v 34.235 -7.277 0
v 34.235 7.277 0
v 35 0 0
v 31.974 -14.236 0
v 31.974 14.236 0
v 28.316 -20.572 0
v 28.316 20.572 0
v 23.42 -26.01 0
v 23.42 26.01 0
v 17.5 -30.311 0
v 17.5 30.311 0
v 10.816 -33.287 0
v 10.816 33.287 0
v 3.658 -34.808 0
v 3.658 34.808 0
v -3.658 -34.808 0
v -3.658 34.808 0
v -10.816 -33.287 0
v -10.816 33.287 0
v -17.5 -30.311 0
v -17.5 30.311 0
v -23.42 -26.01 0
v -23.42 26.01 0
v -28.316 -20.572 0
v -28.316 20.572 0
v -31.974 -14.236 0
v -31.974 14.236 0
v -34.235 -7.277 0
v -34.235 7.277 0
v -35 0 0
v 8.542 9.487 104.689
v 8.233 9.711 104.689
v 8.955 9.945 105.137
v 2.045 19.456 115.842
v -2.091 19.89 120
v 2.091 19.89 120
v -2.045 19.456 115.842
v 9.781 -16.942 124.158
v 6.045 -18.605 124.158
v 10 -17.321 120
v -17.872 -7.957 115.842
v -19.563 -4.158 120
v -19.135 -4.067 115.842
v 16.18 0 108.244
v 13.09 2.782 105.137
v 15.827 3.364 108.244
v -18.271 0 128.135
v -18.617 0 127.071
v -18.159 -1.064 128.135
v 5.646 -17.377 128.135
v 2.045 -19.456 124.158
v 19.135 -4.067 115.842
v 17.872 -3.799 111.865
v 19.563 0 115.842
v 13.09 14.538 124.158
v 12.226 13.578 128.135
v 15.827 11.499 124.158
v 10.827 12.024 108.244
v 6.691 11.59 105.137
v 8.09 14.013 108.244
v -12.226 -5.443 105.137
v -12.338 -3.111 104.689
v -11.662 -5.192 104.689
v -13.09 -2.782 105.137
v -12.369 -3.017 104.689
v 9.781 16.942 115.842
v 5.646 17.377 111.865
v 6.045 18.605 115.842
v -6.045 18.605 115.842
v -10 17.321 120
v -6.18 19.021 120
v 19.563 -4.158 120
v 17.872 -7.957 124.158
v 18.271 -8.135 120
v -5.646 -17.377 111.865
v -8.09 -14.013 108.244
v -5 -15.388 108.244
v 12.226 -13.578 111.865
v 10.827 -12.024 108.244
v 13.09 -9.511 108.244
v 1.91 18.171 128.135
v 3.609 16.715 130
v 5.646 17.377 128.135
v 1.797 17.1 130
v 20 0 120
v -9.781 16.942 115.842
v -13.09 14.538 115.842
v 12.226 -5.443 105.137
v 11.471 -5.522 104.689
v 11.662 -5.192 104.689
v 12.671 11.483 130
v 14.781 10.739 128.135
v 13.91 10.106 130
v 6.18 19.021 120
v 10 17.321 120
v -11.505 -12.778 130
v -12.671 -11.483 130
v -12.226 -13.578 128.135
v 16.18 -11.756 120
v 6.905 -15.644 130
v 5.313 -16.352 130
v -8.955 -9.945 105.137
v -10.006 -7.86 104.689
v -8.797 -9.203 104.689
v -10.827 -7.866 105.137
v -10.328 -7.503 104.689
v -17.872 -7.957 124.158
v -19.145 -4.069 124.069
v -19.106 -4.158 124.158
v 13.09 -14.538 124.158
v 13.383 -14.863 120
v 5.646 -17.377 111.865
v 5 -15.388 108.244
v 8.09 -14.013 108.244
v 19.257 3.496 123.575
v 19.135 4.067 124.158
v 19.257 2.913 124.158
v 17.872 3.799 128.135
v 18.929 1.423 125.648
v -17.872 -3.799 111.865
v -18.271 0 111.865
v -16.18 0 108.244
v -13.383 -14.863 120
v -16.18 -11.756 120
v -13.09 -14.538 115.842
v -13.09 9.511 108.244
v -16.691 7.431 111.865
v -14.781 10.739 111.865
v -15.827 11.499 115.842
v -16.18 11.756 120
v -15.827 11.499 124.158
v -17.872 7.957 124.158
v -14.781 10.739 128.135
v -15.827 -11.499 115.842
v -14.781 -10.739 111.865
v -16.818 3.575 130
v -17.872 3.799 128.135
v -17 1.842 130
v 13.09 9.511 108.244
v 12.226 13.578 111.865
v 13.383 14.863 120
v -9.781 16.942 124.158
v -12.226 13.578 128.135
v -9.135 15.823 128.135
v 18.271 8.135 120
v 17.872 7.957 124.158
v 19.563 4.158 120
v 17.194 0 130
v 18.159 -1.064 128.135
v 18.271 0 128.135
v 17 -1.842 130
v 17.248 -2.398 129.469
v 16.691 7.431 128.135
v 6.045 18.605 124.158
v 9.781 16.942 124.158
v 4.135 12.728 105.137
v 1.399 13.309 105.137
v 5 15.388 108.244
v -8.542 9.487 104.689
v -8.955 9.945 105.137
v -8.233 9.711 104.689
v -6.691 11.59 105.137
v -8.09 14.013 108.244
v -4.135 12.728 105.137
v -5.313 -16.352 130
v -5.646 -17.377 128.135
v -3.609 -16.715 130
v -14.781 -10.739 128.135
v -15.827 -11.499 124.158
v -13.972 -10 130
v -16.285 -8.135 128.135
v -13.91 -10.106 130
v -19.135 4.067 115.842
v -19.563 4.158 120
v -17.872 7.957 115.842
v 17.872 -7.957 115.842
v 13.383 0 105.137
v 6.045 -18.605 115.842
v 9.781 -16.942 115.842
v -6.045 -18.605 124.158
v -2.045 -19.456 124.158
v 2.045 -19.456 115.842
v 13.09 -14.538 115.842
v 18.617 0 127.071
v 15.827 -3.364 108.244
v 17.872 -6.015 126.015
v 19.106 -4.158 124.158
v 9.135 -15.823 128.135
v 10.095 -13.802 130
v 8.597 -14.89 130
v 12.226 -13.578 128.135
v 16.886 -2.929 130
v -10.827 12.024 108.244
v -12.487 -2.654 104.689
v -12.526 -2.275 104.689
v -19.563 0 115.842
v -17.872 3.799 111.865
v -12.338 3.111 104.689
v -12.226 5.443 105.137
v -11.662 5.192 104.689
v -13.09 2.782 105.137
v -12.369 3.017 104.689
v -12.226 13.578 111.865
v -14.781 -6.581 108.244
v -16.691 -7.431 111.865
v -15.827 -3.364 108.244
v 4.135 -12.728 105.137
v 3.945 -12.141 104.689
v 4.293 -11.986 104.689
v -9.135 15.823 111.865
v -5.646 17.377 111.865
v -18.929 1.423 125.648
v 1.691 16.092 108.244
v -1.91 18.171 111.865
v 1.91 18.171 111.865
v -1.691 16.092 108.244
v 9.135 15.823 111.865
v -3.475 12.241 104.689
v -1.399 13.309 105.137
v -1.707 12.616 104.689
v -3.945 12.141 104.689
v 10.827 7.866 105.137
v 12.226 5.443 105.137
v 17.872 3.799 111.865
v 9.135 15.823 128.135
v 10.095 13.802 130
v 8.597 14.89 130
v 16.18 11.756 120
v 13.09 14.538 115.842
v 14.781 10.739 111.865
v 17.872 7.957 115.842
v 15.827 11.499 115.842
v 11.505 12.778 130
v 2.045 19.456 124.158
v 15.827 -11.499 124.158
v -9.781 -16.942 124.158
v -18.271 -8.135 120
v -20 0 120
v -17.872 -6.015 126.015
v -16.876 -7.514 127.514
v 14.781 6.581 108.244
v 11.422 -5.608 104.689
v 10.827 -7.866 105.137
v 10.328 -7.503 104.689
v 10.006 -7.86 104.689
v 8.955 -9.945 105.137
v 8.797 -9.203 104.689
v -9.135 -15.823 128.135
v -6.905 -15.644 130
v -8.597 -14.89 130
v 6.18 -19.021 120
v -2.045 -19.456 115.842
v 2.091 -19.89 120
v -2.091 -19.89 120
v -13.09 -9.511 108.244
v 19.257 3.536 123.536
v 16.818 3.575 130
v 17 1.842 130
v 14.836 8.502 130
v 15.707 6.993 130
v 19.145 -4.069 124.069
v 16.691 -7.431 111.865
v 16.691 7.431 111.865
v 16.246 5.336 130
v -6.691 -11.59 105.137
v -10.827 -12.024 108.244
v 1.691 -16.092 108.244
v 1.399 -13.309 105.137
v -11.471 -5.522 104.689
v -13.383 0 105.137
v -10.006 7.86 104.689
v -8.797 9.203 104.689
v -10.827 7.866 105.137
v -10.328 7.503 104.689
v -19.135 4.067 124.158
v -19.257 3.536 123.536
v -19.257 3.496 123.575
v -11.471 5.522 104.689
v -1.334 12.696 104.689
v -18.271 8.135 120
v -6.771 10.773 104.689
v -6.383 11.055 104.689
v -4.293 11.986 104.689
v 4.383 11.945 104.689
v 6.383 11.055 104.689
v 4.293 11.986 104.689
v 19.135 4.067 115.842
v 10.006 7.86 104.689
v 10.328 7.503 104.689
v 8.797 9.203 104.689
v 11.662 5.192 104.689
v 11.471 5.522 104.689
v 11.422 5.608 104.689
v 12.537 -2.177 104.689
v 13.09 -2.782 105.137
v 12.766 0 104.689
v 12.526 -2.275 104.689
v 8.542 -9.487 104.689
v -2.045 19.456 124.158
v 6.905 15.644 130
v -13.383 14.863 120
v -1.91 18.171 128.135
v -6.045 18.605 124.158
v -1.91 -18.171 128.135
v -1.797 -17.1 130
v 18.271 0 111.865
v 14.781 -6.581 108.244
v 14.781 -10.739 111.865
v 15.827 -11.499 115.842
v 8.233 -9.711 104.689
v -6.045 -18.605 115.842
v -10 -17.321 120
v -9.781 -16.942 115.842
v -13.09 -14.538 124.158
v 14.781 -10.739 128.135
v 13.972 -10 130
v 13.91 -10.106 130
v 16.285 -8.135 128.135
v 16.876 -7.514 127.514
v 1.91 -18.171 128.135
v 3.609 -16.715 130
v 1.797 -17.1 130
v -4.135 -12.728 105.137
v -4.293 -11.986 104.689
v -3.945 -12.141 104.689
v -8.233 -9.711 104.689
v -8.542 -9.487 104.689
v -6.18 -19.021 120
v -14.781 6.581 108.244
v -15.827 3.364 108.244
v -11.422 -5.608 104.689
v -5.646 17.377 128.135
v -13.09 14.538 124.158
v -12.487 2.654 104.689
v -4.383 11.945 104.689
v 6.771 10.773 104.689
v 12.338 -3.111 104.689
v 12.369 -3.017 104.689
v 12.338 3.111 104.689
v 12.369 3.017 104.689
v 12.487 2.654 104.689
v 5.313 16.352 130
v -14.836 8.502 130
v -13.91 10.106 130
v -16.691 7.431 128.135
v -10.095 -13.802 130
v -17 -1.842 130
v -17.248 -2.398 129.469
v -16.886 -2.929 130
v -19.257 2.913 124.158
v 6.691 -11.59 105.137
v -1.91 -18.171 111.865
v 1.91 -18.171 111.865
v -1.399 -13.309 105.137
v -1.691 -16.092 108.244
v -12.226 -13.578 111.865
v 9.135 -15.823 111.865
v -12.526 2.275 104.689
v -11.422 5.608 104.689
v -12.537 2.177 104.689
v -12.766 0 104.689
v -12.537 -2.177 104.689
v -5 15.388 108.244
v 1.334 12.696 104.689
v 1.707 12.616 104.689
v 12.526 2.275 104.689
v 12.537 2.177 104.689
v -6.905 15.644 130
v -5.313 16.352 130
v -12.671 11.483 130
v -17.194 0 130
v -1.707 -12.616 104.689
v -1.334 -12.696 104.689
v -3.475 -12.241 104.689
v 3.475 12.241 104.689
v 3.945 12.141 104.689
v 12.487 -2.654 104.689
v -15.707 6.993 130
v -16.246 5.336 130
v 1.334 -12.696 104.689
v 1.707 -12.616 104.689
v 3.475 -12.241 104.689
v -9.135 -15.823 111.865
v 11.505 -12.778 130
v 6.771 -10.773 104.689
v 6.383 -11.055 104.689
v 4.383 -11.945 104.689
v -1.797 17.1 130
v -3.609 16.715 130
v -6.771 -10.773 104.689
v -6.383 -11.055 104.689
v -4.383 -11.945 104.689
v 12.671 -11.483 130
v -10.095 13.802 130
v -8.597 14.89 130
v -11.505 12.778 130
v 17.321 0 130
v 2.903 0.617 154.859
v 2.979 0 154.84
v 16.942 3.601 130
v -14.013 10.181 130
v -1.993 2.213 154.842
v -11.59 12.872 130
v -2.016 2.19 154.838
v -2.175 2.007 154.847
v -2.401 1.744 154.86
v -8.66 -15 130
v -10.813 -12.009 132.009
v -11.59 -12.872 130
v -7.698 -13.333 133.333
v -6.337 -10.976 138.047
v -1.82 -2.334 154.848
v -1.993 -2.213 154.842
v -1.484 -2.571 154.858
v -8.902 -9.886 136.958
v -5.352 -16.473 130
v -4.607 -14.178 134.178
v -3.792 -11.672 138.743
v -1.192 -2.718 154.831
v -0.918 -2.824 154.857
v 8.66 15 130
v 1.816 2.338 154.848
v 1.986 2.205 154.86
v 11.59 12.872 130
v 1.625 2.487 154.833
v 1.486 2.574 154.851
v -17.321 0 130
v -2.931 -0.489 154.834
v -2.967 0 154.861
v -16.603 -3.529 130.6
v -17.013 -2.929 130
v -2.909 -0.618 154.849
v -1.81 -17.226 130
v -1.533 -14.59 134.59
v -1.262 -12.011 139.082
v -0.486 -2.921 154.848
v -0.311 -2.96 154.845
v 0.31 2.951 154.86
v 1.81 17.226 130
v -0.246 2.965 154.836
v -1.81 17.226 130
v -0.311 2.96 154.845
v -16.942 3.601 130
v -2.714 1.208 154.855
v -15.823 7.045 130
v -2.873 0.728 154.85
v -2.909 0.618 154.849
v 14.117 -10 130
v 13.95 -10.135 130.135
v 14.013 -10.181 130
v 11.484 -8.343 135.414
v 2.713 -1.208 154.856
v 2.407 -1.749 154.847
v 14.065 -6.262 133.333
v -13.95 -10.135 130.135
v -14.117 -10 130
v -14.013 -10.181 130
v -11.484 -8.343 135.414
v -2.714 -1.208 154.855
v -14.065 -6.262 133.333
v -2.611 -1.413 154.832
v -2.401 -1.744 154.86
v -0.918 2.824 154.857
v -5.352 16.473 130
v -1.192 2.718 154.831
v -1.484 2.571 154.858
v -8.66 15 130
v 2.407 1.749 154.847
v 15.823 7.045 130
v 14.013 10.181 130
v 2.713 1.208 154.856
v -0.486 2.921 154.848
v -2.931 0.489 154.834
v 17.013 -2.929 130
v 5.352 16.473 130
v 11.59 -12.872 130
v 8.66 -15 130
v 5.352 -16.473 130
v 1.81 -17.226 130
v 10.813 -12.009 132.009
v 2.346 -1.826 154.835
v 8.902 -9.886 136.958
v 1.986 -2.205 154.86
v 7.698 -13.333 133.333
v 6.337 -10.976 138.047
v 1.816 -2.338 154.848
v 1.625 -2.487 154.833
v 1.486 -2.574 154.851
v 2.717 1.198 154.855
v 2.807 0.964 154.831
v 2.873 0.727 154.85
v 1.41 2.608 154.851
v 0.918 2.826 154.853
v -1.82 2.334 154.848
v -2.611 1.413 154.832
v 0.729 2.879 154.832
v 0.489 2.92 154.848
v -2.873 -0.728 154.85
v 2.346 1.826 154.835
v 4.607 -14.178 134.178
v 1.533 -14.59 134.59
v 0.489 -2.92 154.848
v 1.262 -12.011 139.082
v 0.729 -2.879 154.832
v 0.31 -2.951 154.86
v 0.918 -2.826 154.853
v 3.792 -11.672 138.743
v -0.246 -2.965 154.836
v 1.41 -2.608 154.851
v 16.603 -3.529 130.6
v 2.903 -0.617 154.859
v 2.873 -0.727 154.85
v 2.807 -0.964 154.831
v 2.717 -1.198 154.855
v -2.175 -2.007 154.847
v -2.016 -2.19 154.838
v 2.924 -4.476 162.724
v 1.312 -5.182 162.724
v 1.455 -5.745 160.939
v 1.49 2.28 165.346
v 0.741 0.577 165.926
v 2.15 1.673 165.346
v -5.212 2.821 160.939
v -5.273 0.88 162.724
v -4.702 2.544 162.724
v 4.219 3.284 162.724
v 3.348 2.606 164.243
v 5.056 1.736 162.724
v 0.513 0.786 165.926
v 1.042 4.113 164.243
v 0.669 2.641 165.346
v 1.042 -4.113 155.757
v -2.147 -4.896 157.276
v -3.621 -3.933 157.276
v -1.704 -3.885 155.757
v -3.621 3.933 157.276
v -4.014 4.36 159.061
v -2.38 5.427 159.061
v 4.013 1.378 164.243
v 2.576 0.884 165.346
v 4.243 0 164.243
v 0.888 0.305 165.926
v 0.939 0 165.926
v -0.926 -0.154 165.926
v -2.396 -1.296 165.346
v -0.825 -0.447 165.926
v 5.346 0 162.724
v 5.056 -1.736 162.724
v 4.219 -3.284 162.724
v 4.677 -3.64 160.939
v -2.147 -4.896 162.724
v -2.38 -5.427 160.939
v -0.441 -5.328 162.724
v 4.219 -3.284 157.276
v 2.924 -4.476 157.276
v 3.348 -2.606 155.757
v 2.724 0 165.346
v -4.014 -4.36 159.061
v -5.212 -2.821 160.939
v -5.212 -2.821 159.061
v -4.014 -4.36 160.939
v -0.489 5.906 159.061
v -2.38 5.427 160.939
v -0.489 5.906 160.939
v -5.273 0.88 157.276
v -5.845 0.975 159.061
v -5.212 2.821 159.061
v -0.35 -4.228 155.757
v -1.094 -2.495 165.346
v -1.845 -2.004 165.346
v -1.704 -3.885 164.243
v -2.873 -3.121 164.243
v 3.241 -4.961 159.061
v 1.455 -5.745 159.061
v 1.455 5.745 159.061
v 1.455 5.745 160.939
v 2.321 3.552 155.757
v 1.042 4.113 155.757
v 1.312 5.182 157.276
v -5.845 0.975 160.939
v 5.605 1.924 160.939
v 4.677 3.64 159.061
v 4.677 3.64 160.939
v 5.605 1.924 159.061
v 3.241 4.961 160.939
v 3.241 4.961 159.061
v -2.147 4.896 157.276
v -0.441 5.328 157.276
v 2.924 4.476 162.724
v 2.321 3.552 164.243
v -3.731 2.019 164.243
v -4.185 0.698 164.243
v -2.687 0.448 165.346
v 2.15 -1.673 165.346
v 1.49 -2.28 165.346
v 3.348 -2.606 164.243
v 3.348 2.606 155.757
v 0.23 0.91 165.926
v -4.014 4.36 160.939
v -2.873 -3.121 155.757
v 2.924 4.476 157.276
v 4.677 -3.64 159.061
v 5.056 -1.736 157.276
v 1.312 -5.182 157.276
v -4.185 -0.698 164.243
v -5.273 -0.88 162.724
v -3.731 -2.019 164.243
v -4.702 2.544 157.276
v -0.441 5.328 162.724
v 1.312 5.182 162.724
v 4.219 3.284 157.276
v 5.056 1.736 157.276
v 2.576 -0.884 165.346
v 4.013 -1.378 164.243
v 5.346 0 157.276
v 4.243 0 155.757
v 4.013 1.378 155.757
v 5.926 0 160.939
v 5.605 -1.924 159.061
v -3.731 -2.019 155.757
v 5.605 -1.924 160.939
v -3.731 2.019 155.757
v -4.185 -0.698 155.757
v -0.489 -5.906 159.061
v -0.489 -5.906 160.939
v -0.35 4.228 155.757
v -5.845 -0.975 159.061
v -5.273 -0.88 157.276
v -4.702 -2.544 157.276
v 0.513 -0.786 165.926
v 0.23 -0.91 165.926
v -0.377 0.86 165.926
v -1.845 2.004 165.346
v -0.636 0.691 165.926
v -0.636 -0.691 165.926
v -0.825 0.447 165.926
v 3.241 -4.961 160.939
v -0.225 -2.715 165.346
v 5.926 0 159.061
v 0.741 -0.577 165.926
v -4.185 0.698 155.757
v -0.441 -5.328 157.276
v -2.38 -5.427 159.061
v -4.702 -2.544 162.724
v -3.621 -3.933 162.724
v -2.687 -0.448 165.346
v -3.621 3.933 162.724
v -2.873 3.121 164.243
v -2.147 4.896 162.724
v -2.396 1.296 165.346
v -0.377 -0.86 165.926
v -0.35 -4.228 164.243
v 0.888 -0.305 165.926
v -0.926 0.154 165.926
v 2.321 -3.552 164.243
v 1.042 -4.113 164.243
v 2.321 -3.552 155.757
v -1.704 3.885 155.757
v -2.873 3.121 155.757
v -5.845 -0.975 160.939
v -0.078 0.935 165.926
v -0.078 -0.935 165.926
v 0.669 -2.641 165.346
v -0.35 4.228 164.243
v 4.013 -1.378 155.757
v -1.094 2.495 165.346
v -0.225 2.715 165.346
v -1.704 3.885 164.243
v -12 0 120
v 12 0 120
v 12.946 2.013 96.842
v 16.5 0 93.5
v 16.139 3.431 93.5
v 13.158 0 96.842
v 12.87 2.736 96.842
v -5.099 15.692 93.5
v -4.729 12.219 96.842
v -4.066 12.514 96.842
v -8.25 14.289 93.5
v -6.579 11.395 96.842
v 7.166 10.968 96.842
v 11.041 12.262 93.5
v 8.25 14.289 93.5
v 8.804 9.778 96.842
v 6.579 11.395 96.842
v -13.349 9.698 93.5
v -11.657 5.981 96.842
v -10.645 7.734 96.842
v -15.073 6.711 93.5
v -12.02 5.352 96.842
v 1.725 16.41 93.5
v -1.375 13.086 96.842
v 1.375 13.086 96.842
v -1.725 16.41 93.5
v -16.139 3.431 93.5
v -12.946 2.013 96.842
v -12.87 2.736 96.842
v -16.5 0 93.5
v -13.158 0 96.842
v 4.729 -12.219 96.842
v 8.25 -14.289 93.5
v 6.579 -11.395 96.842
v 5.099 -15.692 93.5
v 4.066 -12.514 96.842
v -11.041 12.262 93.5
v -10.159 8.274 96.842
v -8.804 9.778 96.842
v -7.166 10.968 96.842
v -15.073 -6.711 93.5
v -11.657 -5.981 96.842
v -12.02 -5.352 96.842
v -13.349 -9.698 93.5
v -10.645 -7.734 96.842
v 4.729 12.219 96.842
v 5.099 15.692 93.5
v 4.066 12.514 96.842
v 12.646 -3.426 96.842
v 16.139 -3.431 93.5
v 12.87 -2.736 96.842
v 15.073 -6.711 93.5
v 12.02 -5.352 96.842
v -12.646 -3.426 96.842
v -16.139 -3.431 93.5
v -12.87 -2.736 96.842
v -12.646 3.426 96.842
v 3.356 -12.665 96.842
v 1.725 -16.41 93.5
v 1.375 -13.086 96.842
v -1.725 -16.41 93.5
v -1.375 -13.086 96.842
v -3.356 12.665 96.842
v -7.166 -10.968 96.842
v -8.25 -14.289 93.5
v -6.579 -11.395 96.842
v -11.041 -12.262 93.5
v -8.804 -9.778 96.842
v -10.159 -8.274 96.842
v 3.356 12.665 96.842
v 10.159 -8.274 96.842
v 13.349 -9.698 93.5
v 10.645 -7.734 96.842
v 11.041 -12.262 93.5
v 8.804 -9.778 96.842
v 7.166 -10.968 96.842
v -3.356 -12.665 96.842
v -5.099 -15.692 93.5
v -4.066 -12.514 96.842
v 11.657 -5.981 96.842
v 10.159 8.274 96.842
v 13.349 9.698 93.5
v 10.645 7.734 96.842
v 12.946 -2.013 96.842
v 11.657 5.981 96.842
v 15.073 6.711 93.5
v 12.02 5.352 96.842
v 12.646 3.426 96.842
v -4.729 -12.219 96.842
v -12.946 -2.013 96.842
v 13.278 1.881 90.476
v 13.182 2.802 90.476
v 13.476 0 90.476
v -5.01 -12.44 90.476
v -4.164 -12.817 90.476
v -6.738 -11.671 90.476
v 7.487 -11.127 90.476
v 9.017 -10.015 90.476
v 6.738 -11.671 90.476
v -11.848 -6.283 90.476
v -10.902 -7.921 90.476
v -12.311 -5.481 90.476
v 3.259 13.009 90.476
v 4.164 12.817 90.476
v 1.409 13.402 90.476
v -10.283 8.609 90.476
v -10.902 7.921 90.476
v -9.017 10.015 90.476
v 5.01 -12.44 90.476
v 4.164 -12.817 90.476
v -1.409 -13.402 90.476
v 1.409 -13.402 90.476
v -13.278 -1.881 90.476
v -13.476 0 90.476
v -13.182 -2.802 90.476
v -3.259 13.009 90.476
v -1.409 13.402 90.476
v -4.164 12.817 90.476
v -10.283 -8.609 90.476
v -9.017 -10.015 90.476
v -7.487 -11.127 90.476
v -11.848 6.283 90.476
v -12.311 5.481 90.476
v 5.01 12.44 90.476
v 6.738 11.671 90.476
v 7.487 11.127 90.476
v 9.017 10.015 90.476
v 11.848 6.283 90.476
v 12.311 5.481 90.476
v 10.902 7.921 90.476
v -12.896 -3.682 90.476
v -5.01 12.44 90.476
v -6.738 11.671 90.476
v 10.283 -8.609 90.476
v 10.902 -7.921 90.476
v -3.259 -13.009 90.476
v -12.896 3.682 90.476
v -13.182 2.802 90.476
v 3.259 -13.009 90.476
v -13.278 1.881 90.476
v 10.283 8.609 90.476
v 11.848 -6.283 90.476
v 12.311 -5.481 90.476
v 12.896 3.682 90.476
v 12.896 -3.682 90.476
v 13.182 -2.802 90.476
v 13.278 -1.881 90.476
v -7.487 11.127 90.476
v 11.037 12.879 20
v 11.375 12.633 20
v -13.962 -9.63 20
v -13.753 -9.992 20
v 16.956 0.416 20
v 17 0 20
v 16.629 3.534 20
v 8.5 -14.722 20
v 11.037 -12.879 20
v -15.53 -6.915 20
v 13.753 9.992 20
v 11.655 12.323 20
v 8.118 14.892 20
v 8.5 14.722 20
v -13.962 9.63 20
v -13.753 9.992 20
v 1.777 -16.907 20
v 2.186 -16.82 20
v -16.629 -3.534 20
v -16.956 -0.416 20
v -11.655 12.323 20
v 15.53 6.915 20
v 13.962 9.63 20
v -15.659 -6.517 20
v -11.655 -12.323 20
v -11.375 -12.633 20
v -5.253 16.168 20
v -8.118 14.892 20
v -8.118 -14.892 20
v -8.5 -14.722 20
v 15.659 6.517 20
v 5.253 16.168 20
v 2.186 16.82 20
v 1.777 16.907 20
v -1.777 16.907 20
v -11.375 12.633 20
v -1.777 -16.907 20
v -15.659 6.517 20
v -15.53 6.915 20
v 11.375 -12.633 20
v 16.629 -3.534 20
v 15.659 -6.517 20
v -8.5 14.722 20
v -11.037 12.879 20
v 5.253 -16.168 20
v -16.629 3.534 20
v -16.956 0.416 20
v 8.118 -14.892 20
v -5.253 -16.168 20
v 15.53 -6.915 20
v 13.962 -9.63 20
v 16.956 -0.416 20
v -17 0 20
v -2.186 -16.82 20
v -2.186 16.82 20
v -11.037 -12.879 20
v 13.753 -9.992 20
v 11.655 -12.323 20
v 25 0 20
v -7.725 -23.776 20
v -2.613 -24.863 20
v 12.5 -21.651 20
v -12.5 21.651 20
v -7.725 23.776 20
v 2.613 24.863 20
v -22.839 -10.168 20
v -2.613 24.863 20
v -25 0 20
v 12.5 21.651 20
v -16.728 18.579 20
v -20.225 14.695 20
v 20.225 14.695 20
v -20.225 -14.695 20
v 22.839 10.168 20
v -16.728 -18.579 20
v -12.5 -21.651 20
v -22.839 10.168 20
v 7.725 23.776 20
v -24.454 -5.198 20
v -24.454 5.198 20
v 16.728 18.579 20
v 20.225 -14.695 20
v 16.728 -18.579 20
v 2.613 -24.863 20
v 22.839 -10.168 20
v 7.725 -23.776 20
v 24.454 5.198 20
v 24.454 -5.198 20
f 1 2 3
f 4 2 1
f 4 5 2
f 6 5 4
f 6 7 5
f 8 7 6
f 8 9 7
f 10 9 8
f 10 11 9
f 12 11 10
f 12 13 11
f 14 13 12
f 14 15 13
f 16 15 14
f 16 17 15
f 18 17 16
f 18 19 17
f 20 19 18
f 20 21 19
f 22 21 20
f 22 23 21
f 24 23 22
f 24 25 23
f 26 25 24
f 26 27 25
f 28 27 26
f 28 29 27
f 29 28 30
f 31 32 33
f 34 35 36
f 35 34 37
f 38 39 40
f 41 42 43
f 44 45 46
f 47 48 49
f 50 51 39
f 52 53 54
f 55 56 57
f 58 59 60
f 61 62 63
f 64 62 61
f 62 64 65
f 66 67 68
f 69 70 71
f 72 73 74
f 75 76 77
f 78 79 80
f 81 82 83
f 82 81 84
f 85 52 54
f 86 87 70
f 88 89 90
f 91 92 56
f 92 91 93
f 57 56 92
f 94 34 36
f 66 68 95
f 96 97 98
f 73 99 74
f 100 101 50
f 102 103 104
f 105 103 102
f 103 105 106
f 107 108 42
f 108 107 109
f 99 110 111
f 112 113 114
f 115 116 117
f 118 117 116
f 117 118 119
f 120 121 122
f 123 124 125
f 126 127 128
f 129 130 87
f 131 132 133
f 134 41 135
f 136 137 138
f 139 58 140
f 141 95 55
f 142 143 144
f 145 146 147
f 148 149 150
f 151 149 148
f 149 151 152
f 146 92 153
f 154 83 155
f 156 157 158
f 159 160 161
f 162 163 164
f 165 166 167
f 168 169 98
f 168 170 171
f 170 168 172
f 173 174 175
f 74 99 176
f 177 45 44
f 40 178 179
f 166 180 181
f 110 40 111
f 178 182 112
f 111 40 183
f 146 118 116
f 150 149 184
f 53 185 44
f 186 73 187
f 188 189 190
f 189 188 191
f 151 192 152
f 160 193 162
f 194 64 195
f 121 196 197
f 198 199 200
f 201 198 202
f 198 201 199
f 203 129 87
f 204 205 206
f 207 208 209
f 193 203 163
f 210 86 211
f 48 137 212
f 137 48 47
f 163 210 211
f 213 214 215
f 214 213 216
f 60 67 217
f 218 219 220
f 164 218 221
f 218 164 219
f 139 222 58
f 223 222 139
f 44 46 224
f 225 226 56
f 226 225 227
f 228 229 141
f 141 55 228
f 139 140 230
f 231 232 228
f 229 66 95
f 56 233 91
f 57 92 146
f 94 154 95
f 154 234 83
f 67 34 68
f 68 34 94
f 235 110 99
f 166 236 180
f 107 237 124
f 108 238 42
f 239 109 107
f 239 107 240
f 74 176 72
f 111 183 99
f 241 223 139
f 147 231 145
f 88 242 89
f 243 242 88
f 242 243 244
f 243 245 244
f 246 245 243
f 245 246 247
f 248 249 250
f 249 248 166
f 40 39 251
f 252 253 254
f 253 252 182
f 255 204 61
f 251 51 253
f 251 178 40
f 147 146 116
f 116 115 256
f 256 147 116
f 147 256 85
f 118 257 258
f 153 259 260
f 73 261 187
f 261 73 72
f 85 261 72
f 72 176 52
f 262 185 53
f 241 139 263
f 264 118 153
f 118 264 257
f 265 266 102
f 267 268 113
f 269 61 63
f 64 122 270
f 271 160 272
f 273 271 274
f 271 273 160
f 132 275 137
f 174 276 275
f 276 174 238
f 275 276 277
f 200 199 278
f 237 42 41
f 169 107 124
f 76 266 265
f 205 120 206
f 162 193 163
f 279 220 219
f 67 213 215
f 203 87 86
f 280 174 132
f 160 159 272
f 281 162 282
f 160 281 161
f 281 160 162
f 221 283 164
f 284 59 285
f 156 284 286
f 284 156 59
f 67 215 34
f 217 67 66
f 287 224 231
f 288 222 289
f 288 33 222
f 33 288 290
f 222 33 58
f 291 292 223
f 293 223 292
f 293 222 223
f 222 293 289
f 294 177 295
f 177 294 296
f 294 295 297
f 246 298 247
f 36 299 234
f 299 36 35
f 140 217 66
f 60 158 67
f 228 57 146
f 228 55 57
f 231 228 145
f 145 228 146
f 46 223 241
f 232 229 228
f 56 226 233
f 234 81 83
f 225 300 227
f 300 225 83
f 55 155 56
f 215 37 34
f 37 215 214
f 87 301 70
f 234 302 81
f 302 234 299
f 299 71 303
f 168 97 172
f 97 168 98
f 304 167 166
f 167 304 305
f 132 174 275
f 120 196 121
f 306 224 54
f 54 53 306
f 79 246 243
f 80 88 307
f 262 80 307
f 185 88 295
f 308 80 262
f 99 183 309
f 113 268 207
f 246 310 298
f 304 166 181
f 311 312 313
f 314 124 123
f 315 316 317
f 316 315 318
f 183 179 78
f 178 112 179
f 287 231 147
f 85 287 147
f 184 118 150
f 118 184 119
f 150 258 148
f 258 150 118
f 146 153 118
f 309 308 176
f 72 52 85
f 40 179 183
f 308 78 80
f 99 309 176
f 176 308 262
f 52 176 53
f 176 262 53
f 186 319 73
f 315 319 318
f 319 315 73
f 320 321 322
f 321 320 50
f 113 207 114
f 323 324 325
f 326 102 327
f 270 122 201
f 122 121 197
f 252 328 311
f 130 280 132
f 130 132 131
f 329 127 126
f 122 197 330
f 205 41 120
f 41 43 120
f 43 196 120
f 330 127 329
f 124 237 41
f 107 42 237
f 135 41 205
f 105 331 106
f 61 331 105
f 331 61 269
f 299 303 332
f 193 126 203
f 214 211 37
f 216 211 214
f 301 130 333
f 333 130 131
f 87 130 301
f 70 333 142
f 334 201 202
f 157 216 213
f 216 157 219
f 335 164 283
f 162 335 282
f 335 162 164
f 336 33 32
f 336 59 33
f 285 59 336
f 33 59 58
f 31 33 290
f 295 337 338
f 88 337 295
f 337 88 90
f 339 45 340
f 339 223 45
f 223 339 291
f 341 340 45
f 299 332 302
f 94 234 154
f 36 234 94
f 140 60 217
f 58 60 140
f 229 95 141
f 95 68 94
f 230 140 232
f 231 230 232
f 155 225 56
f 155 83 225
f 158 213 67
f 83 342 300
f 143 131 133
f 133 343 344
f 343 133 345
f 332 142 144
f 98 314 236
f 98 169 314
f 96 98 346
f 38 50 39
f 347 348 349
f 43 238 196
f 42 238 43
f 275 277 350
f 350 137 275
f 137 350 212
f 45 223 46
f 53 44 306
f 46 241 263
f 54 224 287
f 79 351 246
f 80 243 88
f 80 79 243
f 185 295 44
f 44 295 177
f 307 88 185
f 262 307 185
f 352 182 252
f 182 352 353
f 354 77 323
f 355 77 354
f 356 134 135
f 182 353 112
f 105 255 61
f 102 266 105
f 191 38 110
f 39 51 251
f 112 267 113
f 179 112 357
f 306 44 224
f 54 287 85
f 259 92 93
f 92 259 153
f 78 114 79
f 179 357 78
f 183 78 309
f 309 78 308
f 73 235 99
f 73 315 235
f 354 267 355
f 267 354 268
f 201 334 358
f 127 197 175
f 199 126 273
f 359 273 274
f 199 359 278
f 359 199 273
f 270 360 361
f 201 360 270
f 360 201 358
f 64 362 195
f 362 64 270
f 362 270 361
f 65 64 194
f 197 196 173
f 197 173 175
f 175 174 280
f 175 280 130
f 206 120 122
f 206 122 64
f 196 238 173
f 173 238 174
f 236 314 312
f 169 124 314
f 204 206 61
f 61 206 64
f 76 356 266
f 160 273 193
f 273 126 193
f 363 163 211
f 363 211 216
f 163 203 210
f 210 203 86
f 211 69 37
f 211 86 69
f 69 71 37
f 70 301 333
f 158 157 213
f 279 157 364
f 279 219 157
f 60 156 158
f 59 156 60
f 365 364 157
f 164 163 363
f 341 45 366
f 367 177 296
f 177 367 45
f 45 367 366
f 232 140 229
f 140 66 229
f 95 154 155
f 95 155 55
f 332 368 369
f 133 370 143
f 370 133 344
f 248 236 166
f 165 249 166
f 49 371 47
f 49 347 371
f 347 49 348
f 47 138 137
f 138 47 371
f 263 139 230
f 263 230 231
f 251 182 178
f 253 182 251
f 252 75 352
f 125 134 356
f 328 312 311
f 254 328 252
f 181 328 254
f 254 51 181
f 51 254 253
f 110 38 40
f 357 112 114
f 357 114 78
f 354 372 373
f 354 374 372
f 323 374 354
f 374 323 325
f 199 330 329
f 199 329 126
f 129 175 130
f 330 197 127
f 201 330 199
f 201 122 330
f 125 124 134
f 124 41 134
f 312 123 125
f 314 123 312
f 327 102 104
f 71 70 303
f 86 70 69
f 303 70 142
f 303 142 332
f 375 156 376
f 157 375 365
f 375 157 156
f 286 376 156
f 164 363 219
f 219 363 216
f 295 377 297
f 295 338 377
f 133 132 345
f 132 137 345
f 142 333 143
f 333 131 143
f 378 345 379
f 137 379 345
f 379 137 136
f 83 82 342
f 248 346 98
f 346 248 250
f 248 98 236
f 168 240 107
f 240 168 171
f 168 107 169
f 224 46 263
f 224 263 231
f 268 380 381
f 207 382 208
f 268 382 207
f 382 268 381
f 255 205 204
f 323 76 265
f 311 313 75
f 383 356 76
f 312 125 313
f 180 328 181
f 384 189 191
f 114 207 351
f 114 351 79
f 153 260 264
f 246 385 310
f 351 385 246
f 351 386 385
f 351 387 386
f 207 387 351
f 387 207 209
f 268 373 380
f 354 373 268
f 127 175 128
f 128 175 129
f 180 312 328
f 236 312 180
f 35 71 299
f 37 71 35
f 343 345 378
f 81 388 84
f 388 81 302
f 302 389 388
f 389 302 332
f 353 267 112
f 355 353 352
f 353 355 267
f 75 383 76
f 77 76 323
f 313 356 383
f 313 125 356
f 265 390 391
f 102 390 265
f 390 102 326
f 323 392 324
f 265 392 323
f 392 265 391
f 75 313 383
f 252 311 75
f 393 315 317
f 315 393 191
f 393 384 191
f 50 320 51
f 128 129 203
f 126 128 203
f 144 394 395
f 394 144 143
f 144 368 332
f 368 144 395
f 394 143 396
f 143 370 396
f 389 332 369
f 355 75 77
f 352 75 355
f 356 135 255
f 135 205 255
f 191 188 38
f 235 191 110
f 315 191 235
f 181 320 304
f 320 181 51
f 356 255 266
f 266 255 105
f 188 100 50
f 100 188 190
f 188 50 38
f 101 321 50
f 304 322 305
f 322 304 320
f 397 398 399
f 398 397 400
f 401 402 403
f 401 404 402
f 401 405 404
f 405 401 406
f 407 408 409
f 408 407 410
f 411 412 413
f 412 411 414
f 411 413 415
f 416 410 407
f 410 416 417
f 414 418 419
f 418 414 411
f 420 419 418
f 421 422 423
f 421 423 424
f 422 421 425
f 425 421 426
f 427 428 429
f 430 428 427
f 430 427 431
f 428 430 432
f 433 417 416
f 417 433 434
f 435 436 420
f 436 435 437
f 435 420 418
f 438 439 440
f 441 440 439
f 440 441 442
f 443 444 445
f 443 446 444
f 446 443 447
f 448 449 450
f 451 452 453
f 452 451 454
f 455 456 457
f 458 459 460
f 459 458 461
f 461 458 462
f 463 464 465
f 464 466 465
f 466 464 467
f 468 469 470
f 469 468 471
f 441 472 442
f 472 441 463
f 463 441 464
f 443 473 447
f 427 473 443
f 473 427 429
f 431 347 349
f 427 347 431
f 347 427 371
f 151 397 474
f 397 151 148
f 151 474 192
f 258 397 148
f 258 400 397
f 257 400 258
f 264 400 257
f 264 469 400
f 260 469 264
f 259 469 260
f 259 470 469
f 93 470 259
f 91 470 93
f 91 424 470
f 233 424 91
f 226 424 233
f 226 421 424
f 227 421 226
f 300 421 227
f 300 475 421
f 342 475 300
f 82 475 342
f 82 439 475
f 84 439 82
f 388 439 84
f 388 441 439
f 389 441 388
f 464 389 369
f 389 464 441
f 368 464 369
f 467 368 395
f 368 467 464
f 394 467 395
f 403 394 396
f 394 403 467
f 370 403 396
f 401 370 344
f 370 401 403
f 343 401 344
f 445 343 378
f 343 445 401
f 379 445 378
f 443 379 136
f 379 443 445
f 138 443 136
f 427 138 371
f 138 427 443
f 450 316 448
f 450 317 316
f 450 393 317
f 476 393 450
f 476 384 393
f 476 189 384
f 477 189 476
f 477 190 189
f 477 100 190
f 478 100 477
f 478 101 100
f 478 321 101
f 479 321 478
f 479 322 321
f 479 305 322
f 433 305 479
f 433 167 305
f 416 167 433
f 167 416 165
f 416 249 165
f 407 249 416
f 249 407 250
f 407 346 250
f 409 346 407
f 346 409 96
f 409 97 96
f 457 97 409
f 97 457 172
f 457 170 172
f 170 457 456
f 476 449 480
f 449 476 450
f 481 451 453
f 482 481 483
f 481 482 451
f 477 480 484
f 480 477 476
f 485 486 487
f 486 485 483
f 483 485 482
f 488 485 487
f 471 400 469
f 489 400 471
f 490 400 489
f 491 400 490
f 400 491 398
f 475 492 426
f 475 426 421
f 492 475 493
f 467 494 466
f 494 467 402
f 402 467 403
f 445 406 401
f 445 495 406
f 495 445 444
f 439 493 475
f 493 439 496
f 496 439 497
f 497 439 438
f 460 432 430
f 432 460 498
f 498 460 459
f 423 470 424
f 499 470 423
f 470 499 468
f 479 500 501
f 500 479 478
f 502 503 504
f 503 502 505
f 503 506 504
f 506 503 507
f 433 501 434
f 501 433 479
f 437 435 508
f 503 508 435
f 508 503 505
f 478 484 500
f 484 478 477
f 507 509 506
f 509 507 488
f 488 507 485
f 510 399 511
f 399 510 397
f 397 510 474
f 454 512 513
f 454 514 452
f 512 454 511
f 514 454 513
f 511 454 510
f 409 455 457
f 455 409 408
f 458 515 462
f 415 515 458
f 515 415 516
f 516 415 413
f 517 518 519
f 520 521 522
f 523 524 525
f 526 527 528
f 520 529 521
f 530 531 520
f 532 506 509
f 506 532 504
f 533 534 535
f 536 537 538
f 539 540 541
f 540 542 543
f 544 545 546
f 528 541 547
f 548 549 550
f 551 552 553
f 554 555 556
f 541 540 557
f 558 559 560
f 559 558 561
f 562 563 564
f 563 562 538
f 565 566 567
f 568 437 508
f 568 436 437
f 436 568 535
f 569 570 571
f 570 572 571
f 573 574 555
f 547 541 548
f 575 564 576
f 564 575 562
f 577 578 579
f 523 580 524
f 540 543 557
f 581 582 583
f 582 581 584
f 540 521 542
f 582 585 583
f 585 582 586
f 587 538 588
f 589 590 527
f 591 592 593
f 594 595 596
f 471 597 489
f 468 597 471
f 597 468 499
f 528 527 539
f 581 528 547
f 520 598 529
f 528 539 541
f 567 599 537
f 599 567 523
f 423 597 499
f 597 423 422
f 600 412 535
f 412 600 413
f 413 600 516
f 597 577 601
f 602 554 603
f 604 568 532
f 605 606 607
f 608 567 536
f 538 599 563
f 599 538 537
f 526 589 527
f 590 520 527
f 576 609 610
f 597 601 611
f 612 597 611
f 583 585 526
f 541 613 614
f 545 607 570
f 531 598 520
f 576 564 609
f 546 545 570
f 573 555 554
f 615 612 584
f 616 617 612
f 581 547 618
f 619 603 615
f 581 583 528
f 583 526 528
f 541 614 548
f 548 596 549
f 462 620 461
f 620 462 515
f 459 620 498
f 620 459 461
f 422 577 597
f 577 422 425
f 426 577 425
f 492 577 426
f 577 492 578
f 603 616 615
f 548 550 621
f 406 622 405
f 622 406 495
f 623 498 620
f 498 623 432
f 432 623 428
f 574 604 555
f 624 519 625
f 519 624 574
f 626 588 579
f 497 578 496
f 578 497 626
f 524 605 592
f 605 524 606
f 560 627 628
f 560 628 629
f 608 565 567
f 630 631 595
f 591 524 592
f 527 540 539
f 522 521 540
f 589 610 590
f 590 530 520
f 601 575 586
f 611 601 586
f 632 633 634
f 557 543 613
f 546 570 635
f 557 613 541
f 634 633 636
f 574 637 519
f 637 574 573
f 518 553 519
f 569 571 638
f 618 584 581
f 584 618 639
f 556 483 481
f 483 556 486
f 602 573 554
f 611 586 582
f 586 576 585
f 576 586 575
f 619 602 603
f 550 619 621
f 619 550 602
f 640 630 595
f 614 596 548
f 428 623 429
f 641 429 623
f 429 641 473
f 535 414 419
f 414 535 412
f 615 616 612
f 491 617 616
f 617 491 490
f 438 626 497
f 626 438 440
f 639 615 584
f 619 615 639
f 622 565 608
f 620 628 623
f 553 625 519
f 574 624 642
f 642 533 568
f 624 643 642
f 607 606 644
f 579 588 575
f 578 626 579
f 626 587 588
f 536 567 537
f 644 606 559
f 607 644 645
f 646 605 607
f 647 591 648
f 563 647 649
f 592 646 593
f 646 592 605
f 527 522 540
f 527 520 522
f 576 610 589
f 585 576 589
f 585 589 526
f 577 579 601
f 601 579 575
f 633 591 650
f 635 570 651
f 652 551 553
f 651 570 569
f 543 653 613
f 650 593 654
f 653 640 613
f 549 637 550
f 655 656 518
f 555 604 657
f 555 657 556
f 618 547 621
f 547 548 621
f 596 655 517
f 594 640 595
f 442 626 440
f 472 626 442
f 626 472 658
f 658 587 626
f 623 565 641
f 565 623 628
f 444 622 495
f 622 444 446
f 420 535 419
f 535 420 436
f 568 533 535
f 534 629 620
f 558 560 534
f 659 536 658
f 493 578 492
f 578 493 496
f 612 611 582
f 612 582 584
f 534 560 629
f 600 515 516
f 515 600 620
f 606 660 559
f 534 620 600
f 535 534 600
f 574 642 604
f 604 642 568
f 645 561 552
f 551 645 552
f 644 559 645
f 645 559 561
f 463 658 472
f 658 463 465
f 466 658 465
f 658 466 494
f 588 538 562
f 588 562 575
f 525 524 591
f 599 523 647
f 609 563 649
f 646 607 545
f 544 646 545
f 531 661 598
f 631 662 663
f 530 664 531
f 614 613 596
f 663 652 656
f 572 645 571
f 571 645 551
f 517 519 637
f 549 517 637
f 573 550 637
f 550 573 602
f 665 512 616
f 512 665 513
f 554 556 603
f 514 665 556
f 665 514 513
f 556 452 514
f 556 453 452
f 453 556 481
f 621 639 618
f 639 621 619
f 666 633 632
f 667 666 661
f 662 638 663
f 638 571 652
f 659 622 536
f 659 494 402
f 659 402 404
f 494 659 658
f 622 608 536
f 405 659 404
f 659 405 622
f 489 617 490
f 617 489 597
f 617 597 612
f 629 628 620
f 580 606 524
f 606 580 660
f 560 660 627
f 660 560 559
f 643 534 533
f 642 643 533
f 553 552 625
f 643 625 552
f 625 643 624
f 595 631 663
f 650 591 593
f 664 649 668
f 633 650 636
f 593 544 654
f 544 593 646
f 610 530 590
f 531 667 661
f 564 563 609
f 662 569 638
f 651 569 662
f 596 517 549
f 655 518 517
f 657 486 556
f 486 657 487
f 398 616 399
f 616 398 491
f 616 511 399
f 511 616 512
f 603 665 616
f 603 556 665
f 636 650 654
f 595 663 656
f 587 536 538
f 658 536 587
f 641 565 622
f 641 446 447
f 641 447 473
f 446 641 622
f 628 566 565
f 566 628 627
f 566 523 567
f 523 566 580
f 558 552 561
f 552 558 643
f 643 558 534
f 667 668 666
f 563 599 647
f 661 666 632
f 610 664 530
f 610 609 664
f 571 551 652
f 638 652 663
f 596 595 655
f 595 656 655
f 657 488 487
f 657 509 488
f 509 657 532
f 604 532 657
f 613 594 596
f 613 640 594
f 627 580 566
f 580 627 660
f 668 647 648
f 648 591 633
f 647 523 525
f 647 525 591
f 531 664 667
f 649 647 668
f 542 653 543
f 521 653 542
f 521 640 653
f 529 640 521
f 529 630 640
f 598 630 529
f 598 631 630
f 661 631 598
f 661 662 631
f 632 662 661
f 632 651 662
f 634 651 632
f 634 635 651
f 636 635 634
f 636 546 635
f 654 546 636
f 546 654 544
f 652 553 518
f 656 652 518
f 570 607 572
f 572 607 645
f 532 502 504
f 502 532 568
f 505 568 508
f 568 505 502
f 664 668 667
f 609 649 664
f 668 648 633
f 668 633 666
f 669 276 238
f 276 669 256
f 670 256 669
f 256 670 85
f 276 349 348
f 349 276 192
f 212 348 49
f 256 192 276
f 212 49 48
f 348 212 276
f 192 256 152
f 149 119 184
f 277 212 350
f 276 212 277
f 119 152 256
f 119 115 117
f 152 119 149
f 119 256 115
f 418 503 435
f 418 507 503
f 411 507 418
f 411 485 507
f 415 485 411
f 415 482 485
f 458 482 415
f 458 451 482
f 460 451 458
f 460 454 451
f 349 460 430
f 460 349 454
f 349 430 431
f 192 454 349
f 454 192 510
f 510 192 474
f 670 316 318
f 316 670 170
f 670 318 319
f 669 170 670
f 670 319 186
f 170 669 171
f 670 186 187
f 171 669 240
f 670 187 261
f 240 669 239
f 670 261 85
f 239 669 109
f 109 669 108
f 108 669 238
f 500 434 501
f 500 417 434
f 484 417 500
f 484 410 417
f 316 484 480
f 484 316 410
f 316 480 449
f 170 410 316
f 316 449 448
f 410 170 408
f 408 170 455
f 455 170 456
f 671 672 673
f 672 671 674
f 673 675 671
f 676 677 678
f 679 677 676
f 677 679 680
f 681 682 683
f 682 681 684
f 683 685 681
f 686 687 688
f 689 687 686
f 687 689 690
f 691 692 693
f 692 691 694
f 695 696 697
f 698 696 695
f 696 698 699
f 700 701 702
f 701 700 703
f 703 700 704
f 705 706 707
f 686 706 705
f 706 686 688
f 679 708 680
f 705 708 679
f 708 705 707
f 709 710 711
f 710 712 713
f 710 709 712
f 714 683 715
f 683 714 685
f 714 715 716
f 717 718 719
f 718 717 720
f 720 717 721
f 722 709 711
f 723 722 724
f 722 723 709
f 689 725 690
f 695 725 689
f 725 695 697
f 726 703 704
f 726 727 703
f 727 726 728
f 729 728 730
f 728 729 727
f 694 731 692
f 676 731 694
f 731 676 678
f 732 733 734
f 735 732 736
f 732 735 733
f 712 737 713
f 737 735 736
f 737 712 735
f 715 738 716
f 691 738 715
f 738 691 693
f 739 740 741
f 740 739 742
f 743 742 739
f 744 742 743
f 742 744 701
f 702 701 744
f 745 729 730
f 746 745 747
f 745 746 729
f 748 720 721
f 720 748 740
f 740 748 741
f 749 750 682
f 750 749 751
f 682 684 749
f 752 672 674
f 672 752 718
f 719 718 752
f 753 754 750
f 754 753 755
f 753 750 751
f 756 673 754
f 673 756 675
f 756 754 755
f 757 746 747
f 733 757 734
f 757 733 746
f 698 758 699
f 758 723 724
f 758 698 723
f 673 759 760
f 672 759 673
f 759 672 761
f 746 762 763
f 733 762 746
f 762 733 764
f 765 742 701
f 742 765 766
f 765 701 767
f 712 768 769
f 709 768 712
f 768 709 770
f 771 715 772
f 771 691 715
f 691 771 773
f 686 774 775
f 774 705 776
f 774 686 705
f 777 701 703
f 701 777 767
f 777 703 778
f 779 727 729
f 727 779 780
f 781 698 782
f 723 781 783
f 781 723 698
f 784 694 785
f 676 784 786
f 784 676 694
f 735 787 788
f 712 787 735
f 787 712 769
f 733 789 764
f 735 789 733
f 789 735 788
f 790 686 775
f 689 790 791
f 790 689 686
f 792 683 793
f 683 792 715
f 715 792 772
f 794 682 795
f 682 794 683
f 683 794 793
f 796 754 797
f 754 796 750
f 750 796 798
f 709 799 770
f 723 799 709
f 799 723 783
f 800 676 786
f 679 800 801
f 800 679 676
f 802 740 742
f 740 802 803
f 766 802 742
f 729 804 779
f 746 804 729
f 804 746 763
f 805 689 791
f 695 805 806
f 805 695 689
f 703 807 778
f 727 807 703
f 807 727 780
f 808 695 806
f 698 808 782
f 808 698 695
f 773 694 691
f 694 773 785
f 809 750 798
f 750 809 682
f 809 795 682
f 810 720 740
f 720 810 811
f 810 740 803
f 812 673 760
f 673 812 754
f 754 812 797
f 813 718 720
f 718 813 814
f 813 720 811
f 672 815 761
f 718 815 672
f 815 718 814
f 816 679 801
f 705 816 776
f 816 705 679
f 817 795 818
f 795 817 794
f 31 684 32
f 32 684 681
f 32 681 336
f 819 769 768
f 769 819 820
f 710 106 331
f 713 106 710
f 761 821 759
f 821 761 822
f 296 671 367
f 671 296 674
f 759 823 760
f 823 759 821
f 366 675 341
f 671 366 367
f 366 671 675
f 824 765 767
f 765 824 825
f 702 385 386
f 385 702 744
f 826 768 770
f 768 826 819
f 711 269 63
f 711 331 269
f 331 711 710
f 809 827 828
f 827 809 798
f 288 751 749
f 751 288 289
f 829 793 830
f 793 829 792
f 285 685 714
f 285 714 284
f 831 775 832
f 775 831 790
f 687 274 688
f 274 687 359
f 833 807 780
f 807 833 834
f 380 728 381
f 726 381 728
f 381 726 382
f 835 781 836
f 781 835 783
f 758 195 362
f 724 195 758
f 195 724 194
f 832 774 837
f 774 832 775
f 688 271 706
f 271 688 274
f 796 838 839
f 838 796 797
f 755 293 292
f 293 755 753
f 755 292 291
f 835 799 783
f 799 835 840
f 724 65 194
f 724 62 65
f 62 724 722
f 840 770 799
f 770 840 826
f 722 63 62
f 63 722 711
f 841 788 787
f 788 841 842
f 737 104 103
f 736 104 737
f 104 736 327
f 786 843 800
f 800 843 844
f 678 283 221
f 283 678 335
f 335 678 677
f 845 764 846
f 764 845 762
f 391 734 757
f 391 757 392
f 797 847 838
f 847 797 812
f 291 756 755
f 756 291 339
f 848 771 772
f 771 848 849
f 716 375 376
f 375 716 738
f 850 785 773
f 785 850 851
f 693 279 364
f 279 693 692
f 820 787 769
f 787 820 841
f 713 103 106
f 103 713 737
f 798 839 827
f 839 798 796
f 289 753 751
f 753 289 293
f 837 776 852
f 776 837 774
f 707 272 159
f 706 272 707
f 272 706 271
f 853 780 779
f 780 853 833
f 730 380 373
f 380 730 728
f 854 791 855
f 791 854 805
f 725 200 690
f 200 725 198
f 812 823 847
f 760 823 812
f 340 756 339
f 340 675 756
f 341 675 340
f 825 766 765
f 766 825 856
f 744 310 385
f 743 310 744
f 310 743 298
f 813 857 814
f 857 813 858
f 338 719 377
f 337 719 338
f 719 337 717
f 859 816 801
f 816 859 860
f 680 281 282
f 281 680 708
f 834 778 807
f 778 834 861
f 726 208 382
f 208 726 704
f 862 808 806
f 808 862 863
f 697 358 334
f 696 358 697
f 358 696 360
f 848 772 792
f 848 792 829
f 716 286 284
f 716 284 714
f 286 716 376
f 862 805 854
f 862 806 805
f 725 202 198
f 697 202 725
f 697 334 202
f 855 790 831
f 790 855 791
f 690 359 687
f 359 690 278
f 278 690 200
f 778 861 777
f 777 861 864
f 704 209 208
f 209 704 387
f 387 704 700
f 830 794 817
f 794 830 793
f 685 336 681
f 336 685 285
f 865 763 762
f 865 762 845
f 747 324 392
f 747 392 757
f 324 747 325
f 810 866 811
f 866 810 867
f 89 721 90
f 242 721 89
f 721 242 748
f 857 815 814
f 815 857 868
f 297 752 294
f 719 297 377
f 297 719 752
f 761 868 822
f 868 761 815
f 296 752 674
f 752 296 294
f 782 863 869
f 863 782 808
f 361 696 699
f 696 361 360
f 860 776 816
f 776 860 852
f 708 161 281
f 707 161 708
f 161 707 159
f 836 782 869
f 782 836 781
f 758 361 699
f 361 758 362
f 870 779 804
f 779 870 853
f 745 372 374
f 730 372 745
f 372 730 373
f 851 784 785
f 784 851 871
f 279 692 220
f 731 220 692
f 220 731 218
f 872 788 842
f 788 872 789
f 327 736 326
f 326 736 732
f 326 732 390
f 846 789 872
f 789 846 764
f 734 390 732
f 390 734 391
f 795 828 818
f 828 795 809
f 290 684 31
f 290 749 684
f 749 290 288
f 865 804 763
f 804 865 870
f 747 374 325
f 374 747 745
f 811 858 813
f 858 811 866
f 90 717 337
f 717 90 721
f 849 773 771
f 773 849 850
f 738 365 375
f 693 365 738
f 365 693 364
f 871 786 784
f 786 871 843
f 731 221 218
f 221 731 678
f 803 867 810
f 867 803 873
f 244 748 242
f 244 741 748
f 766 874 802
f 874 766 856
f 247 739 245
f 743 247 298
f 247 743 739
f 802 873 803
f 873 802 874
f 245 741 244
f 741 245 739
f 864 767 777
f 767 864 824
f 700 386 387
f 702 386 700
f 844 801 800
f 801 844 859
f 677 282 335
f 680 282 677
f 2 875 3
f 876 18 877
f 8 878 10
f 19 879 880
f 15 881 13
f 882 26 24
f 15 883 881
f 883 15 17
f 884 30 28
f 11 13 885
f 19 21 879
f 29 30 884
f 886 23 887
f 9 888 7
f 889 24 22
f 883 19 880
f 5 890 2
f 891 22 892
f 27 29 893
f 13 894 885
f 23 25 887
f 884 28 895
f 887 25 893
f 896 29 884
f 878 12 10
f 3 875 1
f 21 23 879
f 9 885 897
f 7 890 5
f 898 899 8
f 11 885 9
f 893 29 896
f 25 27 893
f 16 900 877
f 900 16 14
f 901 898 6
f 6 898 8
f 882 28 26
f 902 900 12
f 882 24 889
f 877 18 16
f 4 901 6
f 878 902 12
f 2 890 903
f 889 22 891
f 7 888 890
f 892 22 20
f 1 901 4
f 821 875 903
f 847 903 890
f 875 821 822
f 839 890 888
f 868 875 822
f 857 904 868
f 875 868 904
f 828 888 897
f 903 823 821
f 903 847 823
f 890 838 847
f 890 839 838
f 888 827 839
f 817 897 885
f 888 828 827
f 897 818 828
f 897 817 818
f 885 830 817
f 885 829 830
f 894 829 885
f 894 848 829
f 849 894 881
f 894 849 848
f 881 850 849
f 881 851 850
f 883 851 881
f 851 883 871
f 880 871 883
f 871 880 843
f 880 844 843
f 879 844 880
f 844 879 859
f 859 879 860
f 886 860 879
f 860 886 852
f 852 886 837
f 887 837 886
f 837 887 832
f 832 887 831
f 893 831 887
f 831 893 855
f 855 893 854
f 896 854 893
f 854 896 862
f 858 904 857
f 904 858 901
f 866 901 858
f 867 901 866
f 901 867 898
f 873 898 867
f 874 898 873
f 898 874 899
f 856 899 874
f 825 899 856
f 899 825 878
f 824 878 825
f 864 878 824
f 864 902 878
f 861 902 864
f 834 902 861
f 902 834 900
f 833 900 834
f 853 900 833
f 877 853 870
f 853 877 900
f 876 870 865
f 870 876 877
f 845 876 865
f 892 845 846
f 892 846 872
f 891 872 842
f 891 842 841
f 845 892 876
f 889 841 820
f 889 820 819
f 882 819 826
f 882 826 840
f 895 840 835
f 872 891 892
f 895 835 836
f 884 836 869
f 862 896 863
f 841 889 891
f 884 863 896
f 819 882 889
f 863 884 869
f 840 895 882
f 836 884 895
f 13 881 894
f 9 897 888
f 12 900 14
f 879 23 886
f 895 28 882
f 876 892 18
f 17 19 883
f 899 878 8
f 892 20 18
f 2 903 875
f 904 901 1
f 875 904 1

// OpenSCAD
intersection() {
  cylinder(h = 20, r1 = 20, r2 = 0);
  translate([0, 0, 7])
    mirror([0, 0, 1])
      cylinder(h = 20, r1 = 20, r2 = 0);
}union() {
  // head
  translate([0, 0, 120])
    difference() {
      union() {
        // teardrop shape
        sphere(r = 20);
        translate([0, 0, 20 * sin(30)])
          cylinder(h = 30, r1 = 20 * cos(30), r2 = 0);

        // dollop
        translate([0, 0, 30 + 20 * sin(30)])
          sphere(r = 6);
      }
      //cut out slot
      rotate([45, 0, 0])
        translate([-20, 0, 0])
          cube([40, 5, 40]);
    }
  // neck
  cylinder(h = 120, r1 = 18, r2 = 12);

  // base
  cylinder(h = 20, r1 = 35, r2 = 25);

  // collar
  translate([0, 0, 90])
    intersection() {
      cylinder(h = 20, r1 = 20, r2 = 0);
      translate([0, 0, 7])
        mirror([0, 0, 1])
          cylinder(h = 20, r1 = 20, r2 = 0);
    }
}
